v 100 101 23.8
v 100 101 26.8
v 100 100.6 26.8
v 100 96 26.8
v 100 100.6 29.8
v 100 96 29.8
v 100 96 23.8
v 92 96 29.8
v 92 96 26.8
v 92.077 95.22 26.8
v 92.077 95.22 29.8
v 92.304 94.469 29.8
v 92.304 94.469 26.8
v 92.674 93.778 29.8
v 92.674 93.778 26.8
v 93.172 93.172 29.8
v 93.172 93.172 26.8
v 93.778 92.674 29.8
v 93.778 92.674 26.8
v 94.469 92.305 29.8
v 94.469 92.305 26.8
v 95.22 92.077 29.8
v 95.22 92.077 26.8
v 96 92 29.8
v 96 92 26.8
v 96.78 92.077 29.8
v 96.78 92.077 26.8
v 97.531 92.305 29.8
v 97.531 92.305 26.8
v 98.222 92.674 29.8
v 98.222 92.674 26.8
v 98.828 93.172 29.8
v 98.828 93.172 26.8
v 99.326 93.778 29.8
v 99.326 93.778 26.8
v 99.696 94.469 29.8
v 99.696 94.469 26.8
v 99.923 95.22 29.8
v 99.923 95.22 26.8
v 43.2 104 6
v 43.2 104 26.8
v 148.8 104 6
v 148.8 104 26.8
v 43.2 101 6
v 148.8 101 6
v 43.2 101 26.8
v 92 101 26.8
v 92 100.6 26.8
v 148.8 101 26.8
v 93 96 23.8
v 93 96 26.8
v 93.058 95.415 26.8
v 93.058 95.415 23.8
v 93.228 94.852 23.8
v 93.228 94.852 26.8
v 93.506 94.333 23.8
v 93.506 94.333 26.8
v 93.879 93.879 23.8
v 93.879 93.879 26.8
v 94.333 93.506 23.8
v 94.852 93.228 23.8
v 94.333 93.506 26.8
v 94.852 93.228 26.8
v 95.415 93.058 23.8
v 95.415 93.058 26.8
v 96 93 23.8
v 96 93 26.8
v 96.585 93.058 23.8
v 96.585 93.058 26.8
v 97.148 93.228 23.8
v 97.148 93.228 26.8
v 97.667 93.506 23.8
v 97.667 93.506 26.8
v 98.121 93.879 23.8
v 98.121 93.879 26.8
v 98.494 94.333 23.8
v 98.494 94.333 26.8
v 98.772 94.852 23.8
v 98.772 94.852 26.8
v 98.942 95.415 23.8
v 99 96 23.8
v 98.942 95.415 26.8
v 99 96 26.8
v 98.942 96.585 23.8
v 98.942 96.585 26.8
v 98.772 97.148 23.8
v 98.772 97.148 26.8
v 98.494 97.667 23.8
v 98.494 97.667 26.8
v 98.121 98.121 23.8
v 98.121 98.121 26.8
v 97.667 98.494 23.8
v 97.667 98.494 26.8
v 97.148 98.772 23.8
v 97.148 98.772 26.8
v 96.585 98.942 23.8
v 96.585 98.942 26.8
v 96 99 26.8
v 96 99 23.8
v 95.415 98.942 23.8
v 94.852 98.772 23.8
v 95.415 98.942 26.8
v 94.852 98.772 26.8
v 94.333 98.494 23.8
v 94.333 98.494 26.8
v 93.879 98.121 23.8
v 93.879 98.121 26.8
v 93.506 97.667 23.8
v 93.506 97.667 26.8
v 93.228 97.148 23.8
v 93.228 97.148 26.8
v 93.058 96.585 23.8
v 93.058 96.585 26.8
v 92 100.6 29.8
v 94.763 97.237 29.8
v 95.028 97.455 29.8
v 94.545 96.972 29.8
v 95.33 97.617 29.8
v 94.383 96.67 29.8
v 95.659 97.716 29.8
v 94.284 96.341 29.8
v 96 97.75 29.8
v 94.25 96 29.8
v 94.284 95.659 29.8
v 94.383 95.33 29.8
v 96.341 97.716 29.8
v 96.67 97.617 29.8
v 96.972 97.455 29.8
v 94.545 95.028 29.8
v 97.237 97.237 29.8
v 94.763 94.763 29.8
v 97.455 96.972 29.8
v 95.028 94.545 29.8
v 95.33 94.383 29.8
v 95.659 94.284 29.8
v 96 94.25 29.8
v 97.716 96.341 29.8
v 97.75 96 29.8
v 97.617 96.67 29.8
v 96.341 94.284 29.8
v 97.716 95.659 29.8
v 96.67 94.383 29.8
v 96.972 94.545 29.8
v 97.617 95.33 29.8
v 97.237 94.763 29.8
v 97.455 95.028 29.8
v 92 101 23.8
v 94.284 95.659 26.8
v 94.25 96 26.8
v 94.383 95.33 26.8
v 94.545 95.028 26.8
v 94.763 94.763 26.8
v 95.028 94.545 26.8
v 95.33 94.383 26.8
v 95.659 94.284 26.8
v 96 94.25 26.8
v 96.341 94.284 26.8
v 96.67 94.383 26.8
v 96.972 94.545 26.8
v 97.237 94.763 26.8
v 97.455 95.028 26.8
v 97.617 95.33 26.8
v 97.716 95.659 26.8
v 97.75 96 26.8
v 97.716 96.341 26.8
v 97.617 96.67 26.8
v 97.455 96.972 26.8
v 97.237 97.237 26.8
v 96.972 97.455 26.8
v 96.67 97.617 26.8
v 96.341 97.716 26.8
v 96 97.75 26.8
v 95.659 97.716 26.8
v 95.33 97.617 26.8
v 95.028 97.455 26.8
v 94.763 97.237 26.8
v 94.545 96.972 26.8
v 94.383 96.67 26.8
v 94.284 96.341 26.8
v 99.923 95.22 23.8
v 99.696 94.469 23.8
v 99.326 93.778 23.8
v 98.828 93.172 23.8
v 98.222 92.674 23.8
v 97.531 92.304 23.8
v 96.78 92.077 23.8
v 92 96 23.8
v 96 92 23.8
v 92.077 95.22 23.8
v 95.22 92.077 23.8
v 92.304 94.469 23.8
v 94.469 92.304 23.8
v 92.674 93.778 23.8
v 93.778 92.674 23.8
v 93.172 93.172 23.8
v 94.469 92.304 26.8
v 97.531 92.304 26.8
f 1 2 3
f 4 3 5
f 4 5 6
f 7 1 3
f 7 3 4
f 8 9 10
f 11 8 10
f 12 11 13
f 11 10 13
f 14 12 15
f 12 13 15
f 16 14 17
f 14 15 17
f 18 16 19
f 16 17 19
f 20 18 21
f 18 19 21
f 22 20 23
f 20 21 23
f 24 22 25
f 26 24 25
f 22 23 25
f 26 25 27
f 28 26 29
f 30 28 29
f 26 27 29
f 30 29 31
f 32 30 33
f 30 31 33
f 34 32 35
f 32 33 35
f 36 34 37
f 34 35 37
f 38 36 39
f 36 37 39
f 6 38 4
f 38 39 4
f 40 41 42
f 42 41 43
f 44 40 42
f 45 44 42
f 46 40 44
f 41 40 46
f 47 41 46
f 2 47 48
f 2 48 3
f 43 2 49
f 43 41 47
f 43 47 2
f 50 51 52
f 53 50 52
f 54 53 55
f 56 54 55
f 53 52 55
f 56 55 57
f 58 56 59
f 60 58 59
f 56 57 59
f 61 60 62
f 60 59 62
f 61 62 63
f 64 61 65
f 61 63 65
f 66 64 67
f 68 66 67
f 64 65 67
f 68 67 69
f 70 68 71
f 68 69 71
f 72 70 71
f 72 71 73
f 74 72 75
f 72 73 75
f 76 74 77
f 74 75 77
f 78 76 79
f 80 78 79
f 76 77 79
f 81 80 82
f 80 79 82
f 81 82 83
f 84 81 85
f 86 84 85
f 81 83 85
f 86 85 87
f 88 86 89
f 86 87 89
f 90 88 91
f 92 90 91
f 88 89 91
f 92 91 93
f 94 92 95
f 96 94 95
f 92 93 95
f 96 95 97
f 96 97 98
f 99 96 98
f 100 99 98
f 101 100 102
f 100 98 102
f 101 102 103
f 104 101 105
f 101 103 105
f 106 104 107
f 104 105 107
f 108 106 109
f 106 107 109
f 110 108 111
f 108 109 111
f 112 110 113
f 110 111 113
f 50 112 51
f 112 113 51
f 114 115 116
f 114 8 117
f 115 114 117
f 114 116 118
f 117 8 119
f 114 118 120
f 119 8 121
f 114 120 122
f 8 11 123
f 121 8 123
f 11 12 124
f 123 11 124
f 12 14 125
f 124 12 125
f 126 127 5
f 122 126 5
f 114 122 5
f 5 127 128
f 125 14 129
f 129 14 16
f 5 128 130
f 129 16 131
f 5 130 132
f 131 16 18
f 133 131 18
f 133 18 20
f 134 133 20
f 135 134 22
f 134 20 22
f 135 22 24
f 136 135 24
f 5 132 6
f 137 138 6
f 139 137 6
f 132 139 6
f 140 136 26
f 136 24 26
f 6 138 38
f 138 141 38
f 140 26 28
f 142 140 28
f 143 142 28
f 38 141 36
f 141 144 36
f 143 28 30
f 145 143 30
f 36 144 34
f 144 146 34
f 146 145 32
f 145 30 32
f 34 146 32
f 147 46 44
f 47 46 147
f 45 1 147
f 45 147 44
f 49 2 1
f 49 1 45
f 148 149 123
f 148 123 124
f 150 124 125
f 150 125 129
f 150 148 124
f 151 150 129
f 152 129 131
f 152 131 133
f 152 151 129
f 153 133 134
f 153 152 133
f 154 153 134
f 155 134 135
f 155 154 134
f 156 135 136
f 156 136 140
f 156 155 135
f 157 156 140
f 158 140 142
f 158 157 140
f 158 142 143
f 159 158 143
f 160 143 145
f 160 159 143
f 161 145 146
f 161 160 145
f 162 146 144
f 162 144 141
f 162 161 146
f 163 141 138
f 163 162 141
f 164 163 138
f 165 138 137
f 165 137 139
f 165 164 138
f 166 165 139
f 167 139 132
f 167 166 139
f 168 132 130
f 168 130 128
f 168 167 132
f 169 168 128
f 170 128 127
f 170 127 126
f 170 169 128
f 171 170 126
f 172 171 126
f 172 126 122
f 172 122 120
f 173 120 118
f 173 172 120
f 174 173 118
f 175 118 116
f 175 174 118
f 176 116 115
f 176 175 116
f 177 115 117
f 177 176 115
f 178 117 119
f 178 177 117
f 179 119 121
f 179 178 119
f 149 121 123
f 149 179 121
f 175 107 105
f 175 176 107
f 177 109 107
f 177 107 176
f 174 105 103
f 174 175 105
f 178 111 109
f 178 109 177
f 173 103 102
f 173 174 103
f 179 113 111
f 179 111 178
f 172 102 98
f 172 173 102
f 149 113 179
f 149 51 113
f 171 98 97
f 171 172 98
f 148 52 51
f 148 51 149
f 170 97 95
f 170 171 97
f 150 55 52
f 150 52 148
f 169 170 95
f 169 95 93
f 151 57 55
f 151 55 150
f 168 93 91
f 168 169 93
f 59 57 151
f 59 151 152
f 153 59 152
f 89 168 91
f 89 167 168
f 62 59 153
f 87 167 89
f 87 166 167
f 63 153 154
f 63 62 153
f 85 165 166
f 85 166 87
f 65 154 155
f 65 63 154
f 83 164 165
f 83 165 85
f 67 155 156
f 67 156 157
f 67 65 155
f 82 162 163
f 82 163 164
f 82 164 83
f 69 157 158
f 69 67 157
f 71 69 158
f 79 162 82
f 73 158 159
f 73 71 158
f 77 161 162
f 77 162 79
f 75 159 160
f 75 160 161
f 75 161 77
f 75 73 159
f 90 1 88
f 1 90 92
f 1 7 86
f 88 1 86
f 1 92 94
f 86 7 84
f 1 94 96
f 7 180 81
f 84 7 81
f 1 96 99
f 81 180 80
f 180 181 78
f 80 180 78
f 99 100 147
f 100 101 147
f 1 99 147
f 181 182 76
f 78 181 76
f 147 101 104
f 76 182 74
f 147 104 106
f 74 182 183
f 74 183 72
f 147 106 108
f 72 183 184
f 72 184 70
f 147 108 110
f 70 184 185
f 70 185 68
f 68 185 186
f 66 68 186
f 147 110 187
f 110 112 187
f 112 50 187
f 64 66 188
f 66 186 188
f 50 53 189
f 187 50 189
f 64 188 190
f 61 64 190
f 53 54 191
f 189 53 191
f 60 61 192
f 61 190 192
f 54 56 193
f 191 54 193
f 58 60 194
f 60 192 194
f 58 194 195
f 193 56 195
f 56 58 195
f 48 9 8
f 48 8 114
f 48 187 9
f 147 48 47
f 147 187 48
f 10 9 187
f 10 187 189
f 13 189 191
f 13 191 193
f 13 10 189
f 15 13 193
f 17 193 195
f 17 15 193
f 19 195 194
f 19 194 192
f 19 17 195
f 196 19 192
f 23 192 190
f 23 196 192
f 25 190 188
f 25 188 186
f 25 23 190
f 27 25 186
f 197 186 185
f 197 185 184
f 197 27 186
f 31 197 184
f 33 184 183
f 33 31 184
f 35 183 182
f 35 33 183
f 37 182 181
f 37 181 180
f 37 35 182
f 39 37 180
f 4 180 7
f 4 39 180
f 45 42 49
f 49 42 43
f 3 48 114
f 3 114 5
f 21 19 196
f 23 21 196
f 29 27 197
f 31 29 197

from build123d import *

# Parameters (mm, degrees)
SKETCH015_W  = 105.6
SKETCH015_H  = 20.8
PAD005_DEPTH = 3
SKETCH016_R  = 3
PAD006_DEPTH = 3
SKETCH017_R  = 1.75
PAD007_DEPTH = 3


with BuildPart() as part:
    # Sketch015 → Pad005 (new body)
    with BuildSketch(Plane.XZ.offset(-104)):
        with Locations((96.000001, 16.4)):
            Rectangle(SKETCH015_W, SKETCH015_H)
    extrude(amount=PAD005_DEPTH)

    # Sketch016 (on Face1 of Pad005) → Pad006 (join)
    with BuildSketch(Plane(origin=(0, 0, 26.8), x_dir=(-1, 0, 0), z_dir=(0, 0, 1))):
        with BuildLine():
            ThreePointArc((-92.000001, -96.00002), (-95.999992, -92), (-100.000001, -96.000001))
            Line((-100.000001, -96.000001), (-100.000001, -101))
            Line((-100.000001, -101), (-92.000001, -101))
            Line((-92.000001, -96.00002), (-92.000001, -101))
        make_face()
        with Locations((-96.000001, -96)):
            Circle(SKETCH016_R, mode=Mode.SUBTRACT)
    extrude(amount=-PAD006_DEPTH)

    # Sketch017 (on Face11 of Pad006) → Pad007 (join)
    with BuildSketch(Plane(origin=(0, 0, 26.8), x_dir=(-1, 0, 0), z_dir=(0, 0, 1))):
        with BuildLine():
            Line((-92.000001, -96.00002), (-92.000001, -100.60001))
            Line((-92.000001, -100.60001), (-100.000001, -100.6))
            Line((-100.000001, -100.6), (-100.000001, -96.000001))
            ThreePointArc((-92.000001, -96.00002), (-95.999992, -92.000035), (-100.000001, -96.000001))
        make_face()
        with Locations((-96.000001, -96)):
            Circle(SKETCH017_R, mode=Mode.SUBTRACT)
    extrude(amount=PAD007_DEPTH)


solid = part.part
